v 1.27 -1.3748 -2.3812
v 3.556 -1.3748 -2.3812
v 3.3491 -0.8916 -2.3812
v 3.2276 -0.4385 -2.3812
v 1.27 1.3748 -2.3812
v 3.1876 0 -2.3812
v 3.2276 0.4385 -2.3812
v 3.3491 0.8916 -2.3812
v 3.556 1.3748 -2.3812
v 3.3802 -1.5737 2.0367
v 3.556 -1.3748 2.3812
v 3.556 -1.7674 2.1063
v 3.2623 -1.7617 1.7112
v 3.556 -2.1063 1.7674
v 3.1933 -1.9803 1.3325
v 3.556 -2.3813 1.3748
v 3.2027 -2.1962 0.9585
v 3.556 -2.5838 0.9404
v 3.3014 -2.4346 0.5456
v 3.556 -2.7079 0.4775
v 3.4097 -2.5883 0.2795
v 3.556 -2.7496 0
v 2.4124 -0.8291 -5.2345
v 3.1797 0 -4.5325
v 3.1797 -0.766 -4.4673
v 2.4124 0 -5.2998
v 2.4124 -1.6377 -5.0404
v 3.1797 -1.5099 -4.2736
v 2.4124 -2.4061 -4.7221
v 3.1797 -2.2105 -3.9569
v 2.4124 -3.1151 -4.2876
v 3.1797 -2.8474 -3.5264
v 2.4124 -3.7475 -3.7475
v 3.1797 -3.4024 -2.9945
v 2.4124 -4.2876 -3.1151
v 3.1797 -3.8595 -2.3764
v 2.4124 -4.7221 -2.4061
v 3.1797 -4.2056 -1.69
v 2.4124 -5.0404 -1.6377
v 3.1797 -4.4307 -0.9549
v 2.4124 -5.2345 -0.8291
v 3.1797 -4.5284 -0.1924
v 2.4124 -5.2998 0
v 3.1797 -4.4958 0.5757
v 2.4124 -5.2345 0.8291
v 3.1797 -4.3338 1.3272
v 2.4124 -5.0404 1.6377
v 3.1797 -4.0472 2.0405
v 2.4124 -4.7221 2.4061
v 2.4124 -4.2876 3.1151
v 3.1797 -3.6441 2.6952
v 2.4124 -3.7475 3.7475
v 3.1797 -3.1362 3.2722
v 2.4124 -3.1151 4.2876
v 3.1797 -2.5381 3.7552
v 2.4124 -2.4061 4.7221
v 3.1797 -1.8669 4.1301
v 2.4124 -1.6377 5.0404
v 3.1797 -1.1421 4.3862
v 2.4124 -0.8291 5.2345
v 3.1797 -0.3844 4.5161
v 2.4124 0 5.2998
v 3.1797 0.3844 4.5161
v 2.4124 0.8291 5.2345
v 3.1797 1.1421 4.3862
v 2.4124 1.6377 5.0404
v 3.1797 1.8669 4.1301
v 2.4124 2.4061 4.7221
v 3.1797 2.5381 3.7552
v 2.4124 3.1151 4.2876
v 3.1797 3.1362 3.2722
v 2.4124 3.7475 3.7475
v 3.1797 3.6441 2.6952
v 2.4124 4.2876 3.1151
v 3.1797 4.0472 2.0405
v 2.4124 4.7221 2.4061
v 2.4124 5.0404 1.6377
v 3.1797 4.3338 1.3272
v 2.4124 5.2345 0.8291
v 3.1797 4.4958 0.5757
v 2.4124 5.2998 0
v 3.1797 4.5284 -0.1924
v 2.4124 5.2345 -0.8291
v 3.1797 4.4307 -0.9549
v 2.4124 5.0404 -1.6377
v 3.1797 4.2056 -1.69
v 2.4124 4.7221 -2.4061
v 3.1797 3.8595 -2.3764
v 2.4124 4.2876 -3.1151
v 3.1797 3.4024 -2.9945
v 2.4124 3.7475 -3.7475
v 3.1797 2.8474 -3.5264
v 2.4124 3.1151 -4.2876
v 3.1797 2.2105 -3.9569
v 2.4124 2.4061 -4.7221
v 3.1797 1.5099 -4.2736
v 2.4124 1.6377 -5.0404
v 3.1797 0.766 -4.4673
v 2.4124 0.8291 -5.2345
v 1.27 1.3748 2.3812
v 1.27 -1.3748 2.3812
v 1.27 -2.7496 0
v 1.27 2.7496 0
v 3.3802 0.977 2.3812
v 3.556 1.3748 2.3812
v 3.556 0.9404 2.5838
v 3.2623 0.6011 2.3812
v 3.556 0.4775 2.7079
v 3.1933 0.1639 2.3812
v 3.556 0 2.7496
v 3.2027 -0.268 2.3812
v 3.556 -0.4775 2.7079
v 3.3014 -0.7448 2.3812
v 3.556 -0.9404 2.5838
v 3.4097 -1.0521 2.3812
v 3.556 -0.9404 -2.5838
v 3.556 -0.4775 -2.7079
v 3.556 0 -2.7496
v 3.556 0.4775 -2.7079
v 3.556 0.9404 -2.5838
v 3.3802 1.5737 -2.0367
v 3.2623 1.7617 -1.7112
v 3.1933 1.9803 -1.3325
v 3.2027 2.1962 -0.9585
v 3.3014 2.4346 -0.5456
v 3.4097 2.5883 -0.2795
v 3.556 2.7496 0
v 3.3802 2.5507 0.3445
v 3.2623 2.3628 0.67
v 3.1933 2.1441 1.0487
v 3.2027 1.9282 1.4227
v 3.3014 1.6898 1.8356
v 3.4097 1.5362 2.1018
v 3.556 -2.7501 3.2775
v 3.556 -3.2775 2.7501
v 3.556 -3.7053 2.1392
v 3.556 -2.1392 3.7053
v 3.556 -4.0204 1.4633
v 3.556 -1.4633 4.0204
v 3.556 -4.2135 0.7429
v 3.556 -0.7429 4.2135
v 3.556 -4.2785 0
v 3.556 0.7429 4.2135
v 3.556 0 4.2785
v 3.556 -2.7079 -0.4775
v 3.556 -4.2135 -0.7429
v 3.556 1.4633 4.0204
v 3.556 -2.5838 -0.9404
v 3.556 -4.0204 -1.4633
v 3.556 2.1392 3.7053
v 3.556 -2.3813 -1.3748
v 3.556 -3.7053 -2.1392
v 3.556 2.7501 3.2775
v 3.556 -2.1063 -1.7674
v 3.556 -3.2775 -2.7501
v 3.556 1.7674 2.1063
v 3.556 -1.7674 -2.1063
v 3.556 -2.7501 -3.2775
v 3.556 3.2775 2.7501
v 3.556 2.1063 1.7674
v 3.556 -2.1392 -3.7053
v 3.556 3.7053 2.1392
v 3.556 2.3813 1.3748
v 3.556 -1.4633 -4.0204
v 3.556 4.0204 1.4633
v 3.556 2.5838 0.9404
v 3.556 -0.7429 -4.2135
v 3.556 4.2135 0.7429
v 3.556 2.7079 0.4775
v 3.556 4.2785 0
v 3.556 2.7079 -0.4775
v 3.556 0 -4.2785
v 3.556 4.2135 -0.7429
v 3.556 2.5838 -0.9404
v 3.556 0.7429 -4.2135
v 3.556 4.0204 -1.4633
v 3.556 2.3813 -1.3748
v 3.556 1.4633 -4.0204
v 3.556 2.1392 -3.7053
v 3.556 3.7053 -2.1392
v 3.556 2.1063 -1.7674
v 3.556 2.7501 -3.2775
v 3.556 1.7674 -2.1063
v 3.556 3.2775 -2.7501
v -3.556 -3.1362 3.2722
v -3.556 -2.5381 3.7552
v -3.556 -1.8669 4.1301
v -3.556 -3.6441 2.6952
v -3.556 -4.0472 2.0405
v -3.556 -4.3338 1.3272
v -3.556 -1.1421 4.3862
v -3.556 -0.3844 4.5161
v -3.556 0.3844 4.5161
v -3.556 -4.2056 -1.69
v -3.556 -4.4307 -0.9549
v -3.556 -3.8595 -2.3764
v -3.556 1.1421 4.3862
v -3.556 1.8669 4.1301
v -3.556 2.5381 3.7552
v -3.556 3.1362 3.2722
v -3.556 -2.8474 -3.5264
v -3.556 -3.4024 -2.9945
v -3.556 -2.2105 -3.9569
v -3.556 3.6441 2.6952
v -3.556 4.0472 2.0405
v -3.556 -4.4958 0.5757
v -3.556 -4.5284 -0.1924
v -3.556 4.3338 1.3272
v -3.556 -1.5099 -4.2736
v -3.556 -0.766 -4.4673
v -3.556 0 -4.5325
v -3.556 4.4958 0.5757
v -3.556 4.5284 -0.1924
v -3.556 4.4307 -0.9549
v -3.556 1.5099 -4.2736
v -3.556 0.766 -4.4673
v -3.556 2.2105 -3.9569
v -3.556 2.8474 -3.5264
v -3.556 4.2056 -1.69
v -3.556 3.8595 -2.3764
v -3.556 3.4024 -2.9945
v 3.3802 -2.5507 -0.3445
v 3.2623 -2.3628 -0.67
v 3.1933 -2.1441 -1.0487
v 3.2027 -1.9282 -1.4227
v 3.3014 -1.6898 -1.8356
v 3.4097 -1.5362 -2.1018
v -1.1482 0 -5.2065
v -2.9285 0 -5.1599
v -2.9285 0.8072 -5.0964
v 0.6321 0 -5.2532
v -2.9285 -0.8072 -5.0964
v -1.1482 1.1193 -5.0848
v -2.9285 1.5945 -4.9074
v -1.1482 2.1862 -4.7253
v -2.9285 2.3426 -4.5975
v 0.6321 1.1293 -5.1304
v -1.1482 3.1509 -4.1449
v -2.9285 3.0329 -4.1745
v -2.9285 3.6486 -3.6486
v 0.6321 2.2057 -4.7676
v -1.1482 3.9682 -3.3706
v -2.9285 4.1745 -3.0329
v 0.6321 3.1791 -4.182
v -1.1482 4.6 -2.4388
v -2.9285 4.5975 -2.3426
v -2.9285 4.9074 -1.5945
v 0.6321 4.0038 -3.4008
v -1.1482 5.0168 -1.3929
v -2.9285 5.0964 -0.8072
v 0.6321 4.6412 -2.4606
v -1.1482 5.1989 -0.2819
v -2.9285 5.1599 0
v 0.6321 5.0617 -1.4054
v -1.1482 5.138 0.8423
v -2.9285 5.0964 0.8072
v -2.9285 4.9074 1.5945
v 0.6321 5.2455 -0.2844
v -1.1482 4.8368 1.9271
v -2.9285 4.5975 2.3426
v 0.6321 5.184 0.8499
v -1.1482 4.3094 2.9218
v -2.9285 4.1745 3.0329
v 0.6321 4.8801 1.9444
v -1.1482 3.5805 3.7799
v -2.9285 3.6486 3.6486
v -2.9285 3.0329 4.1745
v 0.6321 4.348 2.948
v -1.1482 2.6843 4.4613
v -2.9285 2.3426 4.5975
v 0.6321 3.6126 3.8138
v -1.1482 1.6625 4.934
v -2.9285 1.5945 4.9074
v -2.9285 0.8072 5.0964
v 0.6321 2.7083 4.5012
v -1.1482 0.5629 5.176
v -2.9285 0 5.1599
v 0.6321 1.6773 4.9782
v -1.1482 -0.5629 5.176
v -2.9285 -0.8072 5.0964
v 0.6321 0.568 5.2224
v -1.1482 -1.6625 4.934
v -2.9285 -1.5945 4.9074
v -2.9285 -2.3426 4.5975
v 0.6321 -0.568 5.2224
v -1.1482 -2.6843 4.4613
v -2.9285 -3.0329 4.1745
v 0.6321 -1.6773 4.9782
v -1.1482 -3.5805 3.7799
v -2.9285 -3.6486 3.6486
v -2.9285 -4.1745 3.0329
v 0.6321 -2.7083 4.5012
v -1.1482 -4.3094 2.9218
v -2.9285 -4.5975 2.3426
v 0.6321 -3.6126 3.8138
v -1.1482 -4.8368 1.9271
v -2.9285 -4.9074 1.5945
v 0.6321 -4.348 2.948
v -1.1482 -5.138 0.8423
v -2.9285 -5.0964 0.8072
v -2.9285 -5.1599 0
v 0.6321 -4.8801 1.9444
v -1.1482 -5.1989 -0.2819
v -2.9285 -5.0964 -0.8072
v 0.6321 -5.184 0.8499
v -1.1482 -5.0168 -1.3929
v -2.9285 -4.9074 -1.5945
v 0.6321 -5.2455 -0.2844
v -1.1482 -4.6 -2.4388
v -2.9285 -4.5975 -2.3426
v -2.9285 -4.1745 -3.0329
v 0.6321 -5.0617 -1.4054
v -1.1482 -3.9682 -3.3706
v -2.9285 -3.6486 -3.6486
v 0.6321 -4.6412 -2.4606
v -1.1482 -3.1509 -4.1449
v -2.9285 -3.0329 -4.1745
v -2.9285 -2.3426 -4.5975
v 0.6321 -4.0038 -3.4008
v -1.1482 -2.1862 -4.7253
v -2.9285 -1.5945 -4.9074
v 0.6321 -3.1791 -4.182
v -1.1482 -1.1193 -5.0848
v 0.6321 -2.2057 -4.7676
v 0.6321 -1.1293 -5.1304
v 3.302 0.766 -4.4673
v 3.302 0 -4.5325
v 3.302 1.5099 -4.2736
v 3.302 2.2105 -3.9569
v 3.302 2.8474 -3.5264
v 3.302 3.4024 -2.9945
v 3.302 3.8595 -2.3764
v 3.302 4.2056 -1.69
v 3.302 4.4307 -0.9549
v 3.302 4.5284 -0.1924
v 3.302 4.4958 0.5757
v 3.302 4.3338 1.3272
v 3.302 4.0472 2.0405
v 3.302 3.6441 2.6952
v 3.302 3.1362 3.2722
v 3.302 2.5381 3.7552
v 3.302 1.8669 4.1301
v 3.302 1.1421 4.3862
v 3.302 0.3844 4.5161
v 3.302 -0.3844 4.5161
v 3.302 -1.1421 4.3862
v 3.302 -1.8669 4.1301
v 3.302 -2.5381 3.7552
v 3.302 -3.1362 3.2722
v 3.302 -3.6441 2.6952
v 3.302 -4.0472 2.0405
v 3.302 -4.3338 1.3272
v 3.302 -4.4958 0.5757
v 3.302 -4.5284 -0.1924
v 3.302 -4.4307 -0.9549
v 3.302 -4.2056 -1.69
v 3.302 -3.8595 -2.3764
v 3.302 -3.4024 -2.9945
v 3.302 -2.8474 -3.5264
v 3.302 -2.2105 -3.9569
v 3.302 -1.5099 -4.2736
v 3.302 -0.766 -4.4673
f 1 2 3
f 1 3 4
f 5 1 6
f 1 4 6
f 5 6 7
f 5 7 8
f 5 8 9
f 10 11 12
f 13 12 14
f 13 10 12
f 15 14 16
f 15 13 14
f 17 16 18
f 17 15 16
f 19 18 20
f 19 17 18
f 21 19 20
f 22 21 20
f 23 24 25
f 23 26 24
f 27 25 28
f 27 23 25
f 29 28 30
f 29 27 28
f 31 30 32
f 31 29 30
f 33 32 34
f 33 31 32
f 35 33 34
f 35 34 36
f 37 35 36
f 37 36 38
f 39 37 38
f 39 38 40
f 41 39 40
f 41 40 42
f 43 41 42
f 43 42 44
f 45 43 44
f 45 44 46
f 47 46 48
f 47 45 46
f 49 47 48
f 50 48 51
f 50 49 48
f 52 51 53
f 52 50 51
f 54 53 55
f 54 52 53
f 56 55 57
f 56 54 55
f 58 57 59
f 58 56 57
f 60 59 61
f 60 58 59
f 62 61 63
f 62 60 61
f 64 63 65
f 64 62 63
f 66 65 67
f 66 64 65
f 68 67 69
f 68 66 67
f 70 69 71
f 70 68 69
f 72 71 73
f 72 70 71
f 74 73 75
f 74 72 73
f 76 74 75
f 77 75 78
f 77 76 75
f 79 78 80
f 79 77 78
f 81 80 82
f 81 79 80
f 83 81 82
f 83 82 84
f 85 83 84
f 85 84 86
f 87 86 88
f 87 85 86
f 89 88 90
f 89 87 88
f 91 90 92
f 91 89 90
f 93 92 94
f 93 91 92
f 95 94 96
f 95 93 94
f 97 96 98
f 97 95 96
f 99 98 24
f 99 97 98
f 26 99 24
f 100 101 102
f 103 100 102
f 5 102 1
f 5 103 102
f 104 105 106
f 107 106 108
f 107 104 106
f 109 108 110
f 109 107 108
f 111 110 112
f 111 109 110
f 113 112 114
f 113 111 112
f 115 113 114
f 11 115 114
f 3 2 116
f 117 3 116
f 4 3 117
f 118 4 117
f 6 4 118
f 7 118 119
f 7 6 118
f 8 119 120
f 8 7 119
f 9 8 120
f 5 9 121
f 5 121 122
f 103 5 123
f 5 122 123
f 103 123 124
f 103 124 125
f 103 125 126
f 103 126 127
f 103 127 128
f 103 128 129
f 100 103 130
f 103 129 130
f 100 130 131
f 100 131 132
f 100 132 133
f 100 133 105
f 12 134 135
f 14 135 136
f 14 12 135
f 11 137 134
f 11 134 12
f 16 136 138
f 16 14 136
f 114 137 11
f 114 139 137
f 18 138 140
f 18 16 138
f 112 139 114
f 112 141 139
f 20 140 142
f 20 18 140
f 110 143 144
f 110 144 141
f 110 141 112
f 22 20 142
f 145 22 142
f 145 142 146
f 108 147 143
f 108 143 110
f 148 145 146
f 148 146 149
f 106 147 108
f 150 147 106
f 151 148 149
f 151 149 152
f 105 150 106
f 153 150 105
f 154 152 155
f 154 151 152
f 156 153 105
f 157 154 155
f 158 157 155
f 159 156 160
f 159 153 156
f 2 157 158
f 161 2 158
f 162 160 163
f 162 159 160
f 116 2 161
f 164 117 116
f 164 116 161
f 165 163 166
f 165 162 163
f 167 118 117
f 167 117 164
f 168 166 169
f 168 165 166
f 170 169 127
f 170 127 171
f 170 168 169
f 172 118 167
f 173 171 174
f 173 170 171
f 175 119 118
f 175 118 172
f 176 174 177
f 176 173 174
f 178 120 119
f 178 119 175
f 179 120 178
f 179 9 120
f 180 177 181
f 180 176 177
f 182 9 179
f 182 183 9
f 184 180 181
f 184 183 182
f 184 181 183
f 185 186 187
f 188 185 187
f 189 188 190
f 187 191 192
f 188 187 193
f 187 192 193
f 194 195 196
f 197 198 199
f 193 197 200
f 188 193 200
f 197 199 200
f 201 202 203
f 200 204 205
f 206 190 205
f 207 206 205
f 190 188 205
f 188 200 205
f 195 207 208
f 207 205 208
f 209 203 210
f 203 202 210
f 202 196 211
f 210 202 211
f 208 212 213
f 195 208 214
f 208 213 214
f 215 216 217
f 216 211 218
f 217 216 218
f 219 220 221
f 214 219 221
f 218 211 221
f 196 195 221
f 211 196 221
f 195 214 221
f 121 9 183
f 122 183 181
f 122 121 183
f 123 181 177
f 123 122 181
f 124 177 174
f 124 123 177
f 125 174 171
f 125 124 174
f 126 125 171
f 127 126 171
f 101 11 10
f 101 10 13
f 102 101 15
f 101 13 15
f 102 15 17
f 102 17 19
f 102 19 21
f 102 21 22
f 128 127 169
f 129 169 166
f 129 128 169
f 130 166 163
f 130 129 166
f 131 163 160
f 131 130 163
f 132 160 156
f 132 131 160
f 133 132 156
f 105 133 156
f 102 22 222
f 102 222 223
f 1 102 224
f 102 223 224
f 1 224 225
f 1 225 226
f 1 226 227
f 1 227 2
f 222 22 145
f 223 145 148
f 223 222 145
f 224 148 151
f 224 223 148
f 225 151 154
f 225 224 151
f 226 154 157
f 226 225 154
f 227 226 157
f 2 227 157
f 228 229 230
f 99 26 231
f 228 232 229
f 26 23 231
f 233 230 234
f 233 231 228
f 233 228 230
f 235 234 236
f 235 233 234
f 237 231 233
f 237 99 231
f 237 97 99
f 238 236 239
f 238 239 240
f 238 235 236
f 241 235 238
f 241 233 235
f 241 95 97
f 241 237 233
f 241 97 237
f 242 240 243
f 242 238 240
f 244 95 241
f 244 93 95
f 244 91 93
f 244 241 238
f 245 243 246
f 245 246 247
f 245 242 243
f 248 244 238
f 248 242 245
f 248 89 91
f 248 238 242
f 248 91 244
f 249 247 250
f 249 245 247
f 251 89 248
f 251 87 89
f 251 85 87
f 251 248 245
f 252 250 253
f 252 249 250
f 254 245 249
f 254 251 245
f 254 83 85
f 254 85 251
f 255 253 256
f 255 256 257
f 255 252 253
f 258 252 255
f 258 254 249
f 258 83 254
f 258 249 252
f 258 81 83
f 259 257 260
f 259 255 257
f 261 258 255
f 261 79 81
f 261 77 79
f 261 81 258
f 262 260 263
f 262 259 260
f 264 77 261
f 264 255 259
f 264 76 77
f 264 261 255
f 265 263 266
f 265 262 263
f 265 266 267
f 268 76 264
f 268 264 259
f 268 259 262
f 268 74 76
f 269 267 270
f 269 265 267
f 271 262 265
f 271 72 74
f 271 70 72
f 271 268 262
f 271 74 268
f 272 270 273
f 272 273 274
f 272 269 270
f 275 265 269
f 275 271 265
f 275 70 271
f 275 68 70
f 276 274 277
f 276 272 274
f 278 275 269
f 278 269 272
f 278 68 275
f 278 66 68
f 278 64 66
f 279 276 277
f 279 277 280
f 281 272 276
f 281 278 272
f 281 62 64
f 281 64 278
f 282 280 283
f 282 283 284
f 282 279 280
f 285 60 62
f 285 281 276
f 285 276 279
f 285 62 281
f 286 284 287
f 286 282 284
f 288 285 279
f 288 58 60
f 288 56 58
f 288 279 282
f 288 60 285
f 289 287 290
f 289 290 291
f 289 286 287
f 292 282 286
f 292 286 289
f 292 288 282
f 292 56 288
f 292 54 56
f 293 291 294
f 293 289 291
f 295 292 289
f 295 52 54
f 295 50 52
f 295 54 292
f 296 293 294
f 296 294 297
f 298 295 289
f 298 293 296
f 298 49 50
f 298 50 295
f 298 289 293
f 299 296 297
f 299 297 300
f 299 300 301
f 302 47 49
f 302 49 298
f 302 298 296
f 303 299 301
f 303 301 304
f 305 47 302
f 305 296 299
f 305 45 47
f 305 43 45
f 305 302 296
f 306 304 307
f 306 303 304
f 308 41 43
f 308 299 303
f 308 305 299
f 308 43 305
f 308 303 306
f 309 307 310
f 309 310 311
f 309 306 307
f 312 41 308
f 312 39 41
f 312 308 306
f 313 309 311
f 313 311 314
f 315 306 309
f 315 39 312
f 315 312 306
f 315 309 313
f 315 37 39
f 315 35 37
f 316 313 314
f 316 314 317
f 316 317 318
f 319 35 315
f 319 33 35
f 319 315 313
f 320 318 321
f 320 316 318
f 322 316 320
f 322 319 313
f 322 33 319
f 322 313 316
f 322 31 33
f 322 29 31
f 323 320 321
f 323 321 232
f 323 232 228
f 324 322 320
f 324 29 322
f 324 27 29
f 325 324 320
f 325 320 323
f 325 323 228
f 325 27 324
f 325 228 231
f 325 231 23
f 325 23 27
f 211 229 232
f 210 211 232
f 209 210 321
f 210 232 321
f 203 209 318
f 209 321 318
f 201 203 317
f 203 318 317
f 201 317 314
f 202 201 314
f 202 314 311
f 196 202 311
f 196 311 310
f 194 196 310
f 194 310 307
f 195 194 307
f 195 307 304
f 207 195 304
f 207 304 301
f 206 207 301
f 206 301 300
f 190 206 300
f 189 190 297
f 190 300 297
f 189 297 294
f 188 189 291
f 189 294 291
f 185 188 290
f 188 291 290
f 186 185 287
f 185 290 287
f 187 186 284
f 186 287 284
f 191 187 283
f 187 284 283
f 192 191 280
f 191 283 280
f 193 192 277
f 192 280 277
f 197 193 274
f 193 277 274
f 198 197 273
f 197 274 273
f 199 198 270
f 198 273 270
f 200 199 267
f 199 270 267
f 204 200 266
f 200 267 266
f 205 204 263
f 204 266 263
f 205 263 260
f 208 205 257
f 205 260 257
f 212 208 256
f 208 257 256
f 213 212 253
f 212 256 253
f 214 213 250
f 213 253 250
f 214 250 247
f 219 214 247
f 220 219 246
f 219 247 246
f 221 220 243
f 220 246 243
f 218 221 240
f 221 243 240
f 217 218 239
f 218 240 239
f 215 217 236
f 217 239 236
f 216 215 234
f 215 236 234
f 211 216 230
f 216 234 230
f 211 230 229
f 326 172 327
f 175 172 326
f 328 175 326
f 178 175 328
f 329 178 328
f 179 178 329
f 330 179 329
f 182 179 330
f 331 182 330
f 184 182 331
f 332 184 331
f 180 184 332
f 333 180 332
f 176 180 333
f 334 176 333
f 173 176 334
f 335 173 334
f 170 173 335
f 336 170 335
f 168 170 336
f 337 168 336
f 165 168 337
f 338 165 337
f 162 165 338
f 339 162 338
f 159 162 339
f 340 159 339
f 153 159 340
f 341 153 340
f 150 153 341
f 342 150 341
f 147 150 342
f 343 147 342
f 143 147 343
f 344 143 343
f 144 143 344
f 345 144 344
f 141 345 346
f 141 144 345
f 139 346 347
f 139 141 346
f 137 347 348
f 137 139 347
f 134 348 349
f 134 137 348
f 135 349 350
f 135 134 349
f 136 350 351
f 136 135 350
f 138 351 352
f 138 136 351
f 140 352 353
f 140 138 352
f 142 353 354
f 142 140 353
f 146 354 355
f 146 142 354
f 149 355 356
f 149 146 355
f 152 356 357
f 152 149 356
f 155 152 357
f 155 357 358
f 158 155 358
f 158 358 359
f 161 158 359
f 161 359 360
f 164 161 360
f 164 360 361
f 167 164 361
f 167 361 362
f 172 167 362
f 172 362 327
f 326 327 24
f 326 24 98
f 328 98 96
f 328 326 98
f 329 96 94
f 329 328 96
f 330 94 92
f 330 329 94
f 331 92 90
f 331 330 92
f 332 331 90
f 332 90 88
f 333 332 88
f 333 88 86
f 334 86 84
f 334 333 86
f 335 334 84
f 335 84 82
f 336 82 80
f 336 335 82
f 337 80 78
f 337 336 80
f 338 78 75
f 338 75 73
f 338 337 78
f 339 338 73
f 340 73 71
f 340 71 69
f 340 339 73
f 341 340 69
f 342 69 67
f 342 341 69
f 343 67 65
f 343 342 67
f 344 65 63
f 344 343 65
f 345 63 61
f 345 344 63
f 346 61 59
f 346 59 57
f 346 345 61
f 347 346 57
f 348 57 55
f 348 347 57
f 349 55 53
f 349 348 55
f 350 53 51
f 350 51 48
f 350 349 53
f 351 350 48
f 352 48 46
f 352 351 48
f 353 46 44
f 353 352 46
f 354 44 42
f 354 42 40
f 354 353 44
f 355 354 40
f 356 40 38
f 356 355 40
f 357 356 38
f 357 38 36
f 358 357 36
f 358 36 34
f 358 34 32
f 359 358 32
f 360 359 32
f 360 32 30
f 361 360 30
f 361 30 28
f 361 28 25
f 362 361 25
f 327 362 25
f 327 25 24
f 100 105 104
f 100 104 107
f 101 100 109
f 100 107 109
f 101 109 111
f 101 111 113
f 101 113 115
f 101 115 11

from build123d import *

# Parameters (mm, degrees)
SKETCH2_R          = 5.1435
EXTRUDE1_DEPTH     = 7.112
EXTRUDE1_TAPER     = -1.5
SKETCH5_OUTSIDE_W  = 32.218
SKETCH5_OUTSIDE_H  = 32.218
SKETCH5_OUTSIDE_R  = 4.532470965
CUT_EXTRUDE1_DEPTH = 8.1120001
CUT_EXTRUDE1_TAPER = 45
SKETCH9_OUTSIDE_W  = 15.994
SKETCH9_OUTSIDE_H  = 15.994
SKETCH9_OUTSIDE_R  = 4.532470965
CUT_EXTRUDE5_DEPTH = 0.376296296
SKETCH10_OUTSIDE_W = 31.44
SKETCH10_OUTSIDE_H = 31.44
SKETCH10_OUTSIDE_R = 4.532470965
CUT_EXTRUDE6_DEPTH = 7.735703804
CUT_EXTRUDE6_TAPER = 45
CUT_EXTRUDE7_DEPTH = 2.286
CHAMFER1_SIZE      = 0.254
SKETCH11_R         = 2.749630657
CUT_EXTRUDE8_DEPTH = 2.286
CUT_EXTRUDE8_TAPER = 45


with BuildPart() as part:
    # Sketch2 → Extrude1 (new body)
    with BuildSketch(Plane(origin=(-3.556, 0, 0), x_dir=(0, 0, -1), z_dir=(1, 0, 0))):
        Circle(SKETCH2_R)
    extrude(amount=EXTRUDE1_DEPTH, taper=EXTRUDE1_TAPER)

    # Sketch5 outside → Cut-Extrude1 (cut, through all)
    with BuildSketch(Plane(origin=(-3.556, 0, 0), x_dir=(0, 0, -1), z_dir=(1, 0, 0))):
        Rectangle(SKETCH5_OUTSIDE_W, SKETCH5_OUTSIDE_H)
        Circle(SKETCH5_OUTSIDE_R, mode=Mode.SUBTRACT)
    extrude(amount=CUT_EXTRUDE1_DEPTH, taper=CUT_EXTRUDE1_TAPER, mode=Mode.SUBTRACT)

    # Sketch9 outside → Cut-Extrude5 (cut)
    with BuildSketch(Plane(origin=(3.556, 0, 0), x_dir=(0, 0, -1), z_dir=(1, 0, 0))):
        Rectangle(SKETCH9_OUTSIDE_W, SKETCH9_OUTSIDE_H)
        Circle(SKETCH9_OUTSIDE_R, mode=Mode.SUBTRACT)
    extrude(amount=-CUT_EXTRUDE5_DEPTH, mode=Mode.SUBTRACT)

    # Sketch10 outside → Cut-Extrude6 (cut, through all)
    with BuildSketch(Plane(origin=(3.179703704, 0, 0), x_dir=(0, 0, -1), z_dir=(1, 0, 0))):
        Rectangle(SKETCH10_OUTSIDE_W, SKETCH10_OUTSIDE_H)
        Circle(SKETCH10_OUTSIDE_R, mode=Mode.SUBTRACT)
    extrude(amount=-CUT_EXTRUDE6_DEPTH, taper=CUT_EXTRUDE6_TAPER, mode=Mode.SUBTRACT)

    # Sketch6 → Cut-Extrude7 (cut)
    with BuildSketch(Plane(origin=(3.556, 0, 0), x_dir=(0, 0, -1), z_dir=(1, 0, 0))):
        Polygon((0, 2.749630657), (-2.38125, 1.374815329), (-2.38125, -1.374815329), (0, -2.749630657), (2.38125, -1.374815329), (2.38125, 1.374815329), align=None)
    extrude(amount=-CUT_EXTRUDE7_DEPTH, mode=Mode.SUBTRACT)

    # Chamfer1
    chamfer1_edges = [part.edges().sort_by_distance(p)[0] for p in [
        (3.556, 0, 4.532470965),
    ]]
    chamfer(chamfer1_edges, length=CHAMFER1_SIZE)

    # Sketch11 → Cut-Extrude8 (cut)
    with BuildSketch(Plane(origin=(3.556, 0, 0), x_dir=(0, 0, -1), z_dir=(1, 0, 0))):
        Circle(SKETCH11_R)
    extrude(amount=-CUT_EXTRUDE8_DEPTH, taper=CUT_EXTRUDE8_TAPER, mode=Mode.SUBTRACT)


solid = part.part
